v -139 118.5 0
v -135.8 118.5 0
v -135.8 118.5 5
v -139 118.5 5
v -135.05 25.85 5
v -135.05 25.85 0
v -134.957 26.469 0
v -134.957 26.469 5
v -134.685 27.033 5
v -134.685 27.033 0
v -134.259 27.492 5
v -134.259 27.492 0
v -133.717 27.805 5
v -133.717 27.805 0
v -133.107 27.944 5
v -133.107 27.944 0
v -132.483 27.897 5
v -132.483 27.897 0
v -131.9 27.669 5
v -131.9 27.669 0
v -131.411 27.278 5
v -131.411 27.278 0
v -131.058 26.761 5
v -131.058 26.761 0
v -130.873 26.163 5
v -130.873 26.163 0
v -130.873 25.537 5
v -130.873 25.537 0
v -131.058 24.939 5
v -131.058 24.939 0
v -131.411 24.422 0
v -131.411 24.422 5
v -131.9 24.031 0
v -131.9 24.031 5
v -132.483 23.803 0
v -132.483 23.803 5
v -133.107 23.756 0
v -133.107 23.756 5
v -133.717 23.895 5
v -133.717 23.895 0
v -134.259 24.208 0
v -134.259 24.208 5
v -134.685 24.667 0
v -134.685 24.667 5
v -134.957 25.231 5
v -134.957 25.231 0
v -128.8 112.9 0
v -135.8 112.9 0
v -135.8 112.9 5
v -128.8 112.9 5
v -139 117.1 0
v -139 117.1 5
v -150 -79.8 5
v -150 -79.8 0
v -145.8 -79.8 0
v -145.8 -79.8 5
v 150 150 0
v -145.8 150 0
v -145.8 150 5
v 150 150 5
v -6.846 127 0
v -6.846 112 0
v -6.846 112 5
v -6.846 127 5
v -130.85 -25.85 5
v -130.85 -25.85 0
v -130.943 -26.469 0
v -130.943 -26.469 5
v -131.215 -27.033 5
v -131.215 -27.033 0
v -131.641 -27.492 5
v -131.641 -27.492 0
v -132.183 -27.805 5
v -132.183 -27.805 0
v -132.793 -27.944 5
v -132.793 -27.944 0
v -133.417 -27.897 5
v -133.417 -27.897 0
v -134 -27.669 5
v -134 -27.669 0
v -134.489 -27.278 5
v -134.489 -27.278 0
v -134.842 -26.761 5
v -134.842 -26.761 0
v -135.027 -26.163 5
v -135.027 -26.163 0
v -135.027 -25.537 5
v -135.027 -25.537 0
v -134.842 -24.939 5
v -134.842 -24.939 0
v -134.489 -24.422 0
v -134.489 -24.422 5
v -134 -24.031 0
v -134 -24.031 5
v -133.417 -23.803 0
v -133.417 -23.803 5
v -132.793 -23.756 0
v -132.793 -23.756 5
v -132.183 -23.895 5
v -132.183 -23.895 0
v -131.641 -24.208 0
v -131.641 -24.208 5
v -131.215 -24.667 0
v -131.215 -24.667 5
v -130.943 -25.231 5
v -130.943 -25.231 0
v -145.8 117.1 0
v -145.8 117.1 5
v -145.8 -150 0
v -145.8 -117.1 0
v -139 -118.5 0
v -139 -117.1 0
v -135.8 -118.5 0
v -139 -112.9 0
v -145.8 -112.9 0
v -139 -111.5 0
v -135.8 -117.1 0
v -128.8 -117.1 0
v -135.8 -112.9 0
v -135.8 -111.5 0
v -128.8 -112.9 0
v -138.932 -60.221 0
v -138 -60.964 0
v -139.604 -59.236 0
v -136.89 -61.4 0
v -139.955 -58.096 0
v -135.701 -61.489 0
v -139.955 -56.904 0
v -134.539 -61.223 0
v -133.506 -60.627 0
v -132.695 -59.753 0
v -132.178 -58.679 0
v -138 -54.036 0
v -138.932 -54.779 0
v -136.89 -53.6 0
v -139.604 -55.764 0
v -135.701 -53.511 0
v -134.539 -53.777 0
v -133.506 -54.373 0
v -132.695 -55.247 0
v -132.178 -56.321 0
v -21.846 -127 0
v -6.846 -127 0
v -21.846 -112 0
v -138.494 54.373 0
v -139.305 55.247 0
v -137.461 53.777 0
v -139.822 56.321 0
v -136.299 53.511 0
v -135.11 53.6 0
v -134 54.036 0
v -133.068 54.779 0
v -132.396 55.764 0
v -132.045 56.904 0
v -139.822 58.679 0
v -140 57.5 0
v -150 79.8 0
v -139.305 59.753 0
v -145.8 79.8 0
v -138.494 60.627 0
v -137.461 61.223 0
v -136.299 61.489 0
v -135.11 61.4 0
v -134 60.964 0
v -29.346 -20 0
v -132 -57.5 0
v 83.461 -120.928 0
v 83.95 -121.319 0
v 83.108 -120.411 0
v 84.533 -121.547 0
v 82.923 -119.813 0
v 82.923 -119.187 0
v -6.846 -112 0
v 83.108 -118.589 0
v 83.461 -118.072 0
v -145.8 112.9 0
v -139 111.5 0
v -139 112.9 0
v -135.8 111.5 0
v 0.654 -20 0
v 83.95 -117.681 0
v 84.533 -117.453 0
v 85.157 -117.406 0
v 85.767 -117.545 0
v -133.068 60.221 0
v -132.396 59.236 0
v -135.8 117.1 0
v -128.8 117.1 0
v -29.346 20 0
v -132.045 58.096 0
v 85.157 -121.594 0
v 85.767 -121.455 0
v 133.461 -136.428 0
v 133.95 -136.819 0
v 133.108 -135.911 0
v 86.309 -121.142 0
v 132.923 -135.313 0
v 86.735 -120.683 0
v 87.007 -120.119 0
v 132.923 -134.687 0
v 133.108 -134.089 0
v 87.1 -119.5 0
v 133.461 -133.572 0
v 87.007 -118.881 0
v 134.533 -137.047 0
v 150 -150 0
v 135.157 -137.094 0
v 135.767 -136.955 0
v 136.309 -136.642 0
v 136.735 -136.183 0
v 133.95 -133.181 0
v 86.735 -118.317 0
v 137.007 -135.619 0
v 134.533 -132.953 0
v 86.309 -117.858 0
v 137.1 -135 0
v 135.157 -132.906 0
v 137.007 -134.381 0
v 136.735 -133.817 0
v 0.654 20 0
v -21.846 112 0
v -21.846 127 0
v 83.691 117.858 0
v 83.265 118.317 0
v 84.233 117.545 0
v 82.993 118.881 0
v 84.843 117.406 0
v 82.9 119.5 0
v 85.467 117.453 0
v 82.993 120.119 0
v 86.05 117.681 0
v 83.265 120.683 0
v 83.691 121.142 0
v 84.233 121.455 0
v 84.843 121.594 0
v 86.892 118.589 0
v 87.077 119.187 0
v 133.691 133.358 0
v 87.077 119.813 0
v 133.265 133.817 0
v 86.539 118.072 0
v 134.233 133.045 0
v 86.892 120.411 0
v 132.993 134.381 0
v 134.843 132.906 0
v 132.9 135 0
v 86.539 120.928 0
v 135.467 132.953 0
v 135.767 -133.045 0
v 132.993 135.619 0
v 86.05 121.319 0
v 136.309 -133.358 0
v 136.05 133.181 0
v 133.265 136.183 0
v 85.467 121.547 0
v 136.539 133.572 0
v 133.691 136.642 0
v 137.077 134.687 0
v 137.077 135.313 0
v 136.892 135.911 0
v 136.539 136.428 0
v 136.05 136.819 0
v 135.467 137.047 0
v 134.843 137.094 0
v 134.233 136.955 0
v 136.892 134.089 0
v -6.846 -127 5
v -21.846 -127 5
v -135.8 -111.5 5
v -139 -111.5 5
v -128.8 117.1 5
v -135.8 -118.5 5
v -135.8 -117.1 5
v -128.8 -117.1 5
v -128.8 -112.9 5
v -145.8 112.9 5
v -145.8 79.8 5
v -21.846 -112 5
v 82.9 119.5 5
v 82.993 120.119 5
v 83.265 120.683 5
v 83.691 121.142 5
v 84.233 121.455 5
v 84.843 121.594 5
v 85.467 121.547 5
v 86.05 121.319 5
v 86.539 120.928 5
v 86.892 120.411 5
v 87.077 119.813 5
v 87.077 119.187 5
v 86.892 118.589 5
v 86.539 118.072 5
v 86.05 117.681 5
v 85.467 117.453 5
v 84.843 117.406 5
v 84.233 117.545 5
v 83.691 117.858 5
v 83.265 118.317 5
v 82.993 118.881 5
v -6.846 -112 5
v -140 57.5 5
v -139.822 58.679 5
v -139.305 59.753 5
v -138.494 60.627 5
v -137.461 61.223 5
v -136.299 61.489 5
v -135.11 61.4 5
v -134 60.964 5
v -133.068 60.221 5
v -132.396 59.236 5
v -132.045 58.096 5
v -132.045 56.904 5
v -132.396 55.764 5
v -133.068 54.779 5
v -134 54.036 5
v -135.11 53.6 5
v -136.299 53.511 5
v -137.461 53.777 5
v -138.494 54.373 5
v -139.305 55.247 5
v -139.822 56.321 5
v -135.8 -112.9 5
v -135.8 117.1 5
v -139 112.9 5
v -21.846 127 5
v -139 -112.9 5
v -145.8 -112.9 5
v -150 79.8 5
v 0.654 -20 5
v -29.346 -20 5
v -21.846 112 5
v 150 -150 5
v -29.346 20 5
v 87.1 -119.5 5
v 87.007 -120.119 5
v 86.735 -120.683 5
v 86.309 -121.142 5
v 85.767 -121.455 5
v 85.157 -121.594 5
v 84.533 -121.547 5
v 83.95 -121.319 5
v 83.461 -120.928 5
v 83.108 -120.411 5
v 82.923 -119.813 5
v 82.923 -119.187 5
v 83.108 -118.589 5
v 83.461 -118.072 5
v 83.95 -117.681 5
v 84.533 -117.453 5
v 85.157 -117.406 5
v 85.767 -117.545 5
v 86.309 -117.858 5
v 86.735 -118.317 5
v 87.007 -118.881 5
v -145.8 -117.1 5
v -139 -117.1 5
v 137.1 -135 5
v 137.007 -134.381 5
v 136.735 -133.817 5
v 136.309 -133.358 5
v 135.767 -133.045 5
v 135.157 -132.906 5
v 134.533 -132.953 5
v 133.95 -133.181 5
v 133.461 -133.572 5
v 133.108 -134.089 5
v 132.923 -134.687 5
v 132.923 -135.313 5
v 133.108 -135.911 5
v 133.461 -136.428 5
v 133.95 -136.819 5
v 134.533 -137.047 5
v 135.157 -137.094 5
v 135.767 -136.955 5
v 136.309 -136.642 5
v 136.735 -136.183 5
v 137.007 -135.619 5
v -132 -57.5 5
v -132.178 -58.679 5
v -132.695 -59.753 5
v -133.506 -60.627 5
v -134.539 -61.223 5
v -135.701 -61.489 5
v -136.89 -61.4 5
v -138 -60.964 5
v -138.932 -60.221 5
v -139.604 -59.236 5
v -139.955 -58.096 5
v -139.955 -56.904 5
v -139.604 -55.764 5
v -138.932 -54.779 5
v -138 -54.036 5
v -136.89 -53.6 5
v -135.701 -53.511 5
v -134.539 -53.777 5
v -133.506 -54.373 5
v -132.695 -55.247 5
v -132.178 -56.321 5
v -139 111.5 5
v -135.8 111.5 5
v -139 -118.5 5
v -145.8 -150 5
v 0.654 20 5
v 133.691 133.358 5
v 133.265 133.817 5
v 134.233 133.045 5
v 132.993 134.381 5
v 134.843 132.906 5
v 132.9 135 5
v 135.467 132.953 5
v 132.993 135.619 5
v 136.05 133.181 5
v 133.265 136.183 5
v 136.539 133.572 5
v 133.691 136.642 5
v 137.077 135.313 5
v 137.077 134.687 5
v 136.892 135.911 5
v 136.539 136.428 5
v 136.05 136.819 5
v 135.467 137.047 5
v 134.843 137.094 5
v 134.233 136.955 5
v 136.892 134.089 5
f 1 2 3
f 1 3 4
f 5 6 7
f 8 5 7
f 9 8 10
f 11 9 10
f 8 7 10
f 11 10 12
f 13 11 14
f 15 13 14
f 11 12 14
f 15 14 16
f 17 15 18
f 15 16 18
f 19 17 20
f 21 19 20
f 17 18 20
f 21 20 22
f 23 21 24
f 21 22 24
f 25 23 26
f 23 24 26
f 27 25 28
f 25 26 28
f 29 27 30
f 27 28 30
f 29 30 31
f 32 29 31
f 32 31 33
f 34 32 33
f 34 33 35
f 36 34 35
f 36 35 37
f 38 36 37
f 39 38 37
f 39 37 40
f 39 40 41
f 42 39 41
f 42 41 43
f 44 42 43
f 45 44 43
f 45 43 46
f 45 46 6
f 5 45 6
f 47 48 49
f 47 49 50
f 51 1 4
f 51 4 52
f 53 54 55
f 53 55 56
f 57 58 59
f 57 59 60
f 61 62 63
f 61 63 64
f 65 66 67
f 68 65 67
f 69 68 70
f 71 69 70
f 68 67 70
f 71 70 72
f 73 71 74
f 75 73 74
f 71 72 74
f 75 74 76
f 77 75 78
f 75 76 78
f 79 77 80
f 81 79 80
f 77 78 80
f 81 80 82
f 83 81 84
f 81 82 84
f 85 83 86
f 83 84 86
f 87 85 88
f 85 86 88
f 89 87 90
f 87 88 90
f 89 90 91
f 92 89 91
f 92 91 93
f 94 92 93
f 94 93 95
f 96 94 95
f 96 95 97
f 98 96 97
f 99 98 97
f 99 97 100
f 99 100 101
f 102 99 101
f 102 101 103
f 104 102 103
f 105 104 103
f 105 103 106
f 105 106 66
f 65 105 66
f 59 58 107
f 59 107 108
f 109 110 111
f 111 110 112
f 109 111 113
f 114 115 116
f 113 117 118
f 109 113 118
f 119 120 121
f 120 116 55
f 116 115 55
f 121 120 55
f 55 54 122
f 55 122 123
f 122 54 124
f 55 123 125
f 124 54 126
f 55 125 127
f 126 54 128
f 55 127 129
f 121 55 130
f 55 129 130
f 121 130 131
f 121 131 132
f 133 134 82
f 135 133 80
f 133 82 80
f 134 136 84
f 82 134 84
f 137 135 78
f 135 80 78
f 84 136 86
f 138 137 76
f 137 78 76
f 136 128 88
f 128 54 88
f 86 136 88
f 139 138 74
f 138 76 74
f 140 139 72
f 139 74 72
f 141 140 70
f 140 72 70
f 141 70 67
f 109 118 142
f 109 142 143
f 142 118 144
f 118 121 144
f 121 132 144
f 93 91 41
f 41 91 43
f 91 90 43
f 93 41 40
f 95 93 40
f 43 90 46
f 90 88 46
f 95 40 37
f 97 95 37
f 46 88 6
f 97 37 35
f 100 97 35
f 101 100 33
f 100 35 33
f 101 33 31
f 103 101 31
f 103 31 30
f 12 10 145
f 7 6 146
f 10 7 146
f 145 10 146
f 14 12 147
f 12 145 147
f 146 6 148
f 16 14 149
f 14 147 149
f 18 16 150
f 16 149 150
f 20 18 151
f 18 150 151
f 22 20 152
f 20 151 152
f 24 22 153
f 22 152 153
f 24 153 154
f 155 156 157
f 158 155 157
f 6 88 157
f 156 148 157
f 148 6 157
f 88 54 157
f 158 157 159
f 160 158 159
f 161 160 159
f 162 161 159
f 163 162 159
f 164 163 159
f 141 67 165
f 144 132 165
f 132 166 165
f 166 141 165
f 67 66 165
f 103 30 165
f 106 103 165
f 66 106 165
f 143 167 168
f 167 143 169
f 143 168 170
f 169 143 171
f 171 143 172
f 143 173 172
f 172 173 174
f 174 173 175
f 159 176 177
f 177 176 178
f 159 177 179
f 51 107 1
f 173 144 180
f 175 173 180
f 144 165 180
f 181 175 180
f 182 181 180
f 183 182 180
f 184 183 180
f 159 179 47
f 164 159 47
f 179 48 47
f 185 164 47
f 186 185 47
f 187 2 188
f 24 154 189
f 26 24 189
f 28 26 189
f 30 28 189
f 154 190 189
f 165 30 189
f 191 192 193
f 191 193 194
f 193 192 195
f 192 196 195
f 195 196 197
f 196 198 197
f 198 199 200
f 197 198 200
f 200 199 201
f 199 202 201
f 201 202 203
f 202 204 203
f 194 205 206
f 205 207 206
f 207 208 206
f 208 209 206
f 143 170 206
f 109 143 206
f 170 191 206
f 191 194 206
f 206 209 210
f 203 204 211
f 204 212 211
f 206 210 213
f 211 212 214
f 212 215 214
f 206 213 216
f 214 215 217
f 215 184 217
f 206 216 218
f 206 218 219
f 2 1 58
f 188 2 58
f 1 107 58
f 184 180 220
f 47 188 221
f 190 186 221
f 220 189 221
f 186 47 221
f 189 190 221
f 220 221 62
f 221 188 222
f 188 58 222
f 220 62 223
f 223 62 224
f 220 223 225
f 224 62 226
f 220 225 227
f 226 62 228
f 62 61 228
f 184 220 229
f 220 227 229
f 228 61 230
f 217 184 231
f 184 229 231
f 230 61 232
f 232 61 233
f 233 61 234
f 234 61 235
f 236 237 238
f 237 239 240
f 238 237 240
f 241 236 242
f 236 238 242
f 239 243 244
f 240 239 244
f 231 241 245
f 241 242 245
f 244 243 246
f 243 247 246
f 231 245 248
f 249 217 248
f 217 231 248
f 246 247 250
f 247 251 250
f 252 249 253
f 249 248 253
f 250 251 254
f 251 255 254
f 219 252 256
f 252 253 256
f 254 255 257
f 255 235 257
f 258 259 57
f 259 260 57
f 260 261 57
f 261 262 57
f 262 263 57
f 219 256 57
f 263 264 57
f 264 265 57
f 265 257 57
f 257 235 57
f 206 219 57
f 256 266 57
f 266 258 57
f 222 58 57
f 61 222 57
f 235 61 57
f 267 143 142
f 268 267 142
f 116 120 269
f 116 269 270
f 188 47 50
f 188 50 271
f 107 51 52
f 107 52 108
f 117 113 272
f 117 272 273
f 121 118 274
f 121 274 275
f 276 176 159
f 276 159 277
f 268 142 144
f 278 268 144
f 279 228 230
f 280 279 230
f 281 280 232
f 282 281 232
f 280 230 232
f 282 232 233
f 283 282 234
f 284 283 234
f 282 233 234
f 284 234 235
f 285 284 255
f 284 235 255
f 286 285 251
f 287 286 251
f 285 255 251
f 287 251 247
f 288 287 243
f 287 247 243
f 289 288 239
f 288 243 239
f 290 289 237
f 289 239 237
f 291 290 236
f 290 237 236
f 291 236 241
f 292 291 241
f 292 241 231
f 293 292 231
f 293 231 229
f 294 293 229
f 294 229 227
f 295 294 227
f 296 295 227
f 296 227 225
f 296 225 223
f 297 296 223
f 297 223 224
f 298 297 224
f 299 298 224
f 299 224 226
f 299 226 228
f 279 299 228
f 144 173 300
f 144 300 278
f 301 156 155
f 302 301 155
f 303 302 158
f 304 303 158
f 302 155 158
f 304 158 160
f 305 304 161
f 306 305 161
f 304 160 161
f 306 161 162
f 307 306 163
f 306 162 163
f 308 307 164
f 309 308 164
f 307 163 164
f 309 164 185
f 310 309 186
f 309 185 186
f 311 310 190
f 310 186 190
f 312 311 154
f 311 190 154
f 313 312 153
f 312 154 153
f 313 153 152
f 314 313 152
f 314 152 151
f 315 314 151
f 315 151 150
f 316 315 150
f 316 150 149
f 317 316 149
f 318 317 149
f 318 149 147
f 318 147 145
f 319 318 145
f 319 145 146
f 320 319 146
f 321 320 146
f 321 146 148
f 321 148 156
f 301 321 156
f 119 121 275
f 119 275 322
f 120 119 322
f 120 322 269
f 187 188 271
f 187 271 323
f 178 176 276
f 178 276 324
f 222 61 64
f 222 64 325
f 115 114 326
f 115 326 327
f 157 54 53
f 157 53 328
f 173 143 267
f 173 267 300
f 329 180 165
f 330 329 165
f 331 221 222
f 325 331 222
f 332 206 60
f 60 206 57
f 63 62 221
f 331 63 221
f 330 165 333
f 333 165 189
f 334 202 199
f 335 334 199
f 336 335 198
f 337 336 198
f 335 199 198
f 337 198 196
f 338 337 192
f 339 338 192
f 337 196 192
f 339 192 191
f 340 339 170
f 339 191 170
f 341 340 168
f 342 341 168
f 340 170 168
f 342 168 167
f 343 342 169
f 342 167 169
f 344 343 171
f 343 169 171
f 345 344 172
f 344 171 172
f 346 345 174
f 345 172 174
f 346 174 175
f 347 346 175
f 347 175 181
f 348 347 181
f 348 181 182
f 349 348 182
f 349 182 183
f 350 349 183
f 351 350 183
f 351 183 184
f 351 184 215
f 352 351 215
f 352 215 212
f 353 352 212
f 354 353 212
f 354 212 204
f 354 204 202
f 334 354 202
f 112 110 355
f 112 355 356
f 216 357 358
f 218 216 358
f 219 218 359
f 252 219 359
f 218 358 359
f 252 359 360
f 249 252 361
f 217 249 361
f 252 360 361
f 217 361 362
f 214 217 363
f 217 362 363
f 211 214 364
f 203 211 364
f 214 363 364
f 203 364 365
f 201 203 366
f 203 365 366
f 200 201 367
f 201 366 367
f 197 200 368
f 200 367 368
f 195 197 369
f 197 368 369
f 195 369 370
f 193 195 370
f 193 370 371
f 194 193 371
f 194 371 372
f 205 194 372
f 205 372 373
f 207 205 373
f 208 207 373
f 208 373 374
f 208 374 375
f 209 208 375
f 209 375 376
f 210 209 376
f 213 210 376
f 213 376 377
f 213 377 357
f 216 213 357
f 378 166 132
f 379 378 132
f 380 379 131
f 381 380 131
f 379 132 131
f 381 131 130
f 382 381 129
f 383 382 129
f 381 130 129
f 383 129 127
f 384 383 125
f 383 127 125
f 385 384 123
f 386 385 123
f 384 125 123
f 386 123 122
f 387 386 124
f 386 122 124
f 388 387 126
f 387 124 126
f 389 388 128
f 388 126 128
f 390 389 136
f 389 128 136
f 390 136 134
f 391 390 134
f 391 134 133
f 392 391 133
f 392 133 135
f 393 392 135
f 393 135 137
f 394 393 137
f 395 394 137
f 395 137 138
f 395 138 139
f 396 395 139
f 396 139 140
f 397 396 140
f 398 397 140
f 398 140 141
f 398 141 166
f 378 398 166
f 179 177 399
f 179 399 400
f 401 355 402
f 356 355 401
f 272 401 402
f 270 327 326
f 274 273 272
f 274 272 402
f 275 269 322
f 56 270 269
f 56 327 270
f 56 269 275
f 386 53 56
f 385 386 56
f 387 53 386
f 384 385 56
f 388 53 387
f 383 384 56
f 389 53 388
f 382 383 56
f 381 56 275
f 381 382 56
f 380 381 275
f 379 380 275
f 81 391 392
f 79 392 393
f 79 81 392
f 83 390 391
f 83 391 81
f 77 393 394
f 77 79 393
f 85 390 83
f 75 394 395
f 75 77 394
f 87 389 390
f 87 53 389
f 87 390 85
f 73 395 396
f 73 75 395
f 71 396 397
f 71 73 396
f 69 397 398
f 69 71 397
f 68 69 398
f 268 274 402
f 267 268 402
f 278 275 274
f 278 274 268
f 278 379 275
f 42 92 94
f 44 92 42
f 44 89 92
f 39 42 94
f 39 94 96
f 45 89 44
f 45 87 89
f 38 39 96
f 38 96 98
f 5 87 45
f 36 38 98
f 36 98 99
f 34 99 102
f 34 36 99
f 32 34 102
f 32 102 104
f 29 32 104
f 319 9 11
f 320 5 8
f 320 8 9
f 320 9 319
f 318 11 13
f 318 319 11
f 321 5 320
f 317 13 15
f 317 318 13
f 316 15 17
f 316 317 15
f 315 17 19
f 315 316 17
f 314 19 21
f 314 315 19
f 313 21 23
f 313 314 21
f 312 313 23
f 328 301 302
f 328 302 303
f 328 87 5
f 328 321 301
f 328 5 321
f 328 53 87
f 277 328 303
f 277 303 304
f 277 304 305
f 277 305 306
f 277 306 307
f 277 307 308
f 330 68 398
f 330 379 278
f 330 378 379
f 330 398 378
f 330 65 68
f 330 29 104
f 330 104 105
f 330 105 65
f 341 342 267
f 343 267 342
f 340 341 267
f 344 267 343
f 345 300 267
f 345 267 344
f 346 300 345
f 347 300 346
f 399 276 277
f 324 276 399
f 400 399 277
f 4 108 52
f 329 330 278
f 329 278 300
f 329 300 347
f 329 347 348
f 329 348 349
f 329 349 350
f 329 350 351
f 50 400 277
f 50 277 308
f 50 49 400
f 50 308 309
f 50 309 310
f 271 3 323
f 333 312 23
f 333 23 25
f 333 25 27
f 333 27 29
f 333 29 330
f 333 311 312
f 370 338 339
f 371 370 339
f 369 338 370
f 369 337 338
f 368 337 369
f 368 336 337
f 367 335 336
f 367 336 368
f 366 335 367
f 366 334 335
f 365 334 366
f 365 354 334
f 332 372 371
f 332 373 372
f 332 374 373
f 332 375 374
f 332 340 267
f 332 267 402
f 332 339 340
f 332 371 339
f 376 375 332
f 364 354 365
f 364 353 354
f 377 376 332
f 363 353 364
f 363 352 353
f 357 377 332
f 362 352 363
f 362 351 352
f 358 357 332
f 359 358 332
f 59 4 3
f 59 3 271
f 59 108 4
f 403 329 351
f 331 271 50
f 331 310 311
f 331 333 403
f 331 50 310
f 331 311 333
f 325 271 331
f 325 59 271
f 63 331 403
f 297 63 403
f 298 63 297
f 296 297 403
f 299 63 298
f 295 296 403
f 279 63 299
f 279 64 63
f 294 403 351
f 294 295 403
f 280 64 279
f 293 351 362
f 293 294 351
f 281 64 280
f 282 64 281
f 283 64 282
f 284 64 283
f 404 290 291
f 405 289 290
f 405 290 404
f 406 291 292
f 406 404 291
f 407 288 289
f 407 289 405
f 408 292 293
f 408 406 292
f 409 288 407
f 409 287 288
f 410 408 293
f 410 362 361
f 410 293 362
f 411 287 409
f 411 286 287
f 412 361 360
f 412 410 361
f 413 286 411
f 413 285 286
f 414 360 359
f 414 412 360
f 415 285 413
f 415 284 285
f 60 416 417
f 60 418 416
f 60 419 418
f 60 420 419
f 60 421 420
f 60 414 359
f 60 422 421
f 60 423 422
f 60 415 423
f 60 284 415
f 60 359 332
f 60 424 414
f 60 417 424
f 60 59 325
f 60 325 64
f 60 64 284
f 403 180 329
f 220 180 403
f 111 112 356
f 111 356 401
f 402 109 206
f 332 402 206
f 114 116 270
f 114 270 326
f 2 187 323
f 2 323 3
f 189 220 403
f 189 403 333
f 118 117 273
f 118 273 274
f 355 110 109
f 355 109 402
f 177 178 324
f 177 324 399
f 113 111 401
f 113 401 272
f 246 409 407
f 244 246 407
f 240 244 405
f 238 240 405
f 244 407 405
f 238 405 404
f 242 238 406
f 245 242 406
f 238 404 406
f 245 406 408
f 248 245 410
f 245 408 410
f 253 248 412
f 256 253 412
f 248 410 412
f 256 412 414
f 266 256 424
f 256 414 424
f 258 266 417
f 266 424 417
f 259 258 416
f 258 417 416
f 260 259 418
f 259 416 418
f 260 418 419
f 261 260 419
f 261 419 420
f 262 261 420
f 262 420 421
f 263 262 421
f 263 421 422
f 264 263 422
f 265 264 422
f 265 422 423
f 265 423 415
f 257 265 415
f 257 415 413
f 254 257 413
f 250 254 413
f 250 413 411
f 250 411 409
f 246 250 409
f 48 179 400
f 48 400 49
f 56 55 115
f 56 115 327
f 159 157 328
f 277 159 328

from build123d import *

# Parameters (mm, degrees)
ESQUISSE1_W              = 300
ESQUISSE1_H              = 300
BOSS_EXTRU_1_DEPTH       = 5
ESQUISSE4_W              = 5
ESQUISSE4_H              = 70.2
ENL_V_MAT_EXTRU_3_DEPTH  = 4.2
ESQUISSE7_R              = 2.1
ENL_V_MAT_EXTRU_6_DEPTH  = 213.190951739
ESQUISSE8_W              = 30
ESQUISSE8_H              = 40
ENL_V_MAT_EXTRU_7_DEPTH  = 213.190951739
ESQUISSE9_R              = 4
ENL_V_MAT_EXTRU_8_DEPTH  = 213.190951739
ESQUISSE10_R             = 2.1
ENL_V_MAT_EXTRU_9_DEPTH  = 213.190951739
ESQUISSE11_W             = 15
ESQUISSE11_H             = 15
ENL_V_MAT_EXTRU_10_DEPTH = 213.190951739
ENL_V_MAT_EXTRU_11_DEPTH = 213.190951739
ESQUISSE13_R             = 2.1
ENL_V_MAT_EXTRU_12_DEPTH = 213.190951739


with BuildPart() as part:
    # Esquisse1 → Boss.-Extru.1 (new body)
    with BuildSketch(Plane.XY):
        Rectangle(ESQUISSE1_W, ESQUISSE1_H)
    extrude(amount=BOSS_EXTRU_1_DEPTH)

    # Esquisse4 → Enlèv. mat.-Extru.3 (cut)
    with BuildSketch(Plane.ZY.offset(150)):
        with Locations((2.5, 114.9)):
            Rectangle(ESQUISSE4_W, ESQUISSE4_H)
        with Locations((2.5, -114.9)):
            Rectangle(ESQUISSE4_W, ESQUISSE4_H)
    extrude(amount=-ENL_V_MAT_EXTRU_3_DEPTH, mode=Mode.SUBTRACT)

    # Esquisse7 → Enlèv. mat.-Extru.6 (cut, through all)
    with BuildSketch(Plane.XY.offset(5)):
        with Locations((135, -135)):
            Circle(ESQUISSE7_R)
        with Locations(Location((135, 135, 0), (0, 0, 180))):
            Circle(ESQUISSE7_R)
    extrude(amount=-ENL_V_MAT_EXTRU_6_DEPTH, mode=Mode.SUBTRACT)

    # Esquisse8 → Enlèv. mat.-Extru.7 (cut, through all)
    with BuildSketch(Plane(origin=(0, 0, 0), x_dir=(-1, 0, 0), z_dir=(0, 0, -1))):
        with Locations((14.345984425, 0)):
            Rectangle(ESQUISSE8_W, ESQUISSE8_H)
    extrude(amount=-ENL_V_MAT_EXTRU_7_DEPTH, mode=Mode.SUBTRACT)

    # Esquisse9 → Enlèv. mat.-Extru.8 (cut, through all)
    with BuildSketch(Plane(origin=(0, 0, 0), x_dir=(-1, 0, 0), z_dir=(0, 0, -1))):
        with Locations((136, 57.5)):
            Circle(ESQUISSE9_R)
        with Locations(Location((136, -57.5, 0), (0, 0, 180))):
            Circle(ESQUISSE9_R)
    extrude(amount=-ENL_V_MAT_EXTRU_8_DEPTH, mode=Mode.SUBTRACT)

    # Esquisse10 → Enlèv. mat.-Extru.9 (cut, through all)
    with BuildSketch(Plane(origin=(0, 0, 0), x_dir=(-1, 0, 0), z_dir=(0, 0, -1))):
        with Locations((-85, 119.5)):
            Circle(ESQUISSE10_R)
        with Locations(Location((-85, -119.5, 0), (0, 0, 180))):
            Circle(ESQUISSE10_R)
    extrude(amount=-ENL_V_MAT_EXTRU_9_DEPTH, mode=Mode.SUBTRACT)

    # Esquisse11 → Enlèv. mat.-Extru.10 (cut, through all)
    with BuildSketch(Plane(origin=(0, 0, 0), x_dir=(-1, 0, 0), z_dir=(0, 0, -1))):
        with Locations((14.345984425, 119.5)):
            Rectangle(ESQUISSE11_W, ESQUISSE11_H)
        with Locations((14.345984425, -119.5)):
            Rectangle(ESQUISSE11_W, ESQUISSE11_H)
    extrude(amount=-ENL_V_MAT_EXTRU_10_DEPTH, mode=Mode.SUBTRACT)

    # Esquisse12 → Enlèv. mat.-Extru.11 (cut, through all)
    with BuildSketch(Plane(origin=(0, 0, 0), x_dir=(-1, 0, 0), z_dir=(0, 0, -1))):
        Polygon((145.8, -115), (145.8, -117.1), (139, -117.1), (139, -118.5), (135.8, -118.5), (135.8, -117.1), (128.8, -117.1), (128.8, -112.9), (135.8, -112.9), (135.8, -111.5), (139, -111.5), (139, -112.9), (145.8, -112.9), align=None)
        Polygon((145.8, 115), (145.8, 112.9), (139, 112.9), (139, 111.5), (135.8, 111.5), (135.8, 112.9), (128.8, 112.9), (128.8, 117.1), (135.8, 117.1), (135.8, 118.5), (139, 118.5), (139, 117.1), (145.8, 117.1), align=None)
    extrude(amount=-ENL_V_MAT_EXTRU_11_DEPTH, mode=Mode.SUBTRACT)

    # Esquisse13 → Enlèv. mat.-Extru.12 (cut, through all)
    with BuildSketch(Plane(origin=(0, 0, 0), x_dir=(-1, 0, 0), z_dir=(0, 0, -1))):
        with Locations((132.95, 25.85)):
            Circle(ESQUISSE13_R)
        with Locations(Location((132.95, -25.85, 0), (0, 0, 180))):
            Circle(ESQUISSE13_R)
    extrude(amount=-ENL_V_MAT_EXTRU_12_DEPTH, mode=Mode.SUBTRACT)


solid = part.part
